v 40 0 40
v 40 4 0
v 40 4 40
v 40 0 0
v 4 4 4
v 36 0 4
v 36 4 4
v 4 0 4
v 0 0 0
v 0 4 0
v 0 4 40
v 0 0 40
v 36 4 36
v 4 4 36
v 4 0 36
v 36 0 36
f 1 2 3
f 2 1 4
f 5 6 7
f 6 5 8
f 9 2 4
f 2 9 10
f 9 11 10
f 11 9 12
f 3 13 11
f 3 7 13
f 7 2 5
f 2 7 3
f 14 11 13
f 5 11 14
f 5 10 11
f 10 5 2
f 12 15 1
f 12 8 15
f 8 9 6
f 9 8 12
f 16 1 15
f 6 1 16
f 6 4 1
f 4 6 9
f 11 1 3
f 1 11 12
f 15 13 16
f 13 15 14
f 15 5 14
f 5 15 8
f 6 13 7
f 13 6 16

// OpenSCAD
// U-shaped spring clip.
$fn = 60;
eps = 0.02;
clip_w = 40;
clip_h = 40;
clip_t = 4;
union() { cube([clip_w,clip_t,clip_t]); translate([0,0,clip_h-clip_t]) cube([clip_w,clip_t,clip_t]); cube([clip_t,clip_t,clip_h]); translate([clip_w-clip_t,0,0]) cube([clip_t,clip_t,clip_h]); }
